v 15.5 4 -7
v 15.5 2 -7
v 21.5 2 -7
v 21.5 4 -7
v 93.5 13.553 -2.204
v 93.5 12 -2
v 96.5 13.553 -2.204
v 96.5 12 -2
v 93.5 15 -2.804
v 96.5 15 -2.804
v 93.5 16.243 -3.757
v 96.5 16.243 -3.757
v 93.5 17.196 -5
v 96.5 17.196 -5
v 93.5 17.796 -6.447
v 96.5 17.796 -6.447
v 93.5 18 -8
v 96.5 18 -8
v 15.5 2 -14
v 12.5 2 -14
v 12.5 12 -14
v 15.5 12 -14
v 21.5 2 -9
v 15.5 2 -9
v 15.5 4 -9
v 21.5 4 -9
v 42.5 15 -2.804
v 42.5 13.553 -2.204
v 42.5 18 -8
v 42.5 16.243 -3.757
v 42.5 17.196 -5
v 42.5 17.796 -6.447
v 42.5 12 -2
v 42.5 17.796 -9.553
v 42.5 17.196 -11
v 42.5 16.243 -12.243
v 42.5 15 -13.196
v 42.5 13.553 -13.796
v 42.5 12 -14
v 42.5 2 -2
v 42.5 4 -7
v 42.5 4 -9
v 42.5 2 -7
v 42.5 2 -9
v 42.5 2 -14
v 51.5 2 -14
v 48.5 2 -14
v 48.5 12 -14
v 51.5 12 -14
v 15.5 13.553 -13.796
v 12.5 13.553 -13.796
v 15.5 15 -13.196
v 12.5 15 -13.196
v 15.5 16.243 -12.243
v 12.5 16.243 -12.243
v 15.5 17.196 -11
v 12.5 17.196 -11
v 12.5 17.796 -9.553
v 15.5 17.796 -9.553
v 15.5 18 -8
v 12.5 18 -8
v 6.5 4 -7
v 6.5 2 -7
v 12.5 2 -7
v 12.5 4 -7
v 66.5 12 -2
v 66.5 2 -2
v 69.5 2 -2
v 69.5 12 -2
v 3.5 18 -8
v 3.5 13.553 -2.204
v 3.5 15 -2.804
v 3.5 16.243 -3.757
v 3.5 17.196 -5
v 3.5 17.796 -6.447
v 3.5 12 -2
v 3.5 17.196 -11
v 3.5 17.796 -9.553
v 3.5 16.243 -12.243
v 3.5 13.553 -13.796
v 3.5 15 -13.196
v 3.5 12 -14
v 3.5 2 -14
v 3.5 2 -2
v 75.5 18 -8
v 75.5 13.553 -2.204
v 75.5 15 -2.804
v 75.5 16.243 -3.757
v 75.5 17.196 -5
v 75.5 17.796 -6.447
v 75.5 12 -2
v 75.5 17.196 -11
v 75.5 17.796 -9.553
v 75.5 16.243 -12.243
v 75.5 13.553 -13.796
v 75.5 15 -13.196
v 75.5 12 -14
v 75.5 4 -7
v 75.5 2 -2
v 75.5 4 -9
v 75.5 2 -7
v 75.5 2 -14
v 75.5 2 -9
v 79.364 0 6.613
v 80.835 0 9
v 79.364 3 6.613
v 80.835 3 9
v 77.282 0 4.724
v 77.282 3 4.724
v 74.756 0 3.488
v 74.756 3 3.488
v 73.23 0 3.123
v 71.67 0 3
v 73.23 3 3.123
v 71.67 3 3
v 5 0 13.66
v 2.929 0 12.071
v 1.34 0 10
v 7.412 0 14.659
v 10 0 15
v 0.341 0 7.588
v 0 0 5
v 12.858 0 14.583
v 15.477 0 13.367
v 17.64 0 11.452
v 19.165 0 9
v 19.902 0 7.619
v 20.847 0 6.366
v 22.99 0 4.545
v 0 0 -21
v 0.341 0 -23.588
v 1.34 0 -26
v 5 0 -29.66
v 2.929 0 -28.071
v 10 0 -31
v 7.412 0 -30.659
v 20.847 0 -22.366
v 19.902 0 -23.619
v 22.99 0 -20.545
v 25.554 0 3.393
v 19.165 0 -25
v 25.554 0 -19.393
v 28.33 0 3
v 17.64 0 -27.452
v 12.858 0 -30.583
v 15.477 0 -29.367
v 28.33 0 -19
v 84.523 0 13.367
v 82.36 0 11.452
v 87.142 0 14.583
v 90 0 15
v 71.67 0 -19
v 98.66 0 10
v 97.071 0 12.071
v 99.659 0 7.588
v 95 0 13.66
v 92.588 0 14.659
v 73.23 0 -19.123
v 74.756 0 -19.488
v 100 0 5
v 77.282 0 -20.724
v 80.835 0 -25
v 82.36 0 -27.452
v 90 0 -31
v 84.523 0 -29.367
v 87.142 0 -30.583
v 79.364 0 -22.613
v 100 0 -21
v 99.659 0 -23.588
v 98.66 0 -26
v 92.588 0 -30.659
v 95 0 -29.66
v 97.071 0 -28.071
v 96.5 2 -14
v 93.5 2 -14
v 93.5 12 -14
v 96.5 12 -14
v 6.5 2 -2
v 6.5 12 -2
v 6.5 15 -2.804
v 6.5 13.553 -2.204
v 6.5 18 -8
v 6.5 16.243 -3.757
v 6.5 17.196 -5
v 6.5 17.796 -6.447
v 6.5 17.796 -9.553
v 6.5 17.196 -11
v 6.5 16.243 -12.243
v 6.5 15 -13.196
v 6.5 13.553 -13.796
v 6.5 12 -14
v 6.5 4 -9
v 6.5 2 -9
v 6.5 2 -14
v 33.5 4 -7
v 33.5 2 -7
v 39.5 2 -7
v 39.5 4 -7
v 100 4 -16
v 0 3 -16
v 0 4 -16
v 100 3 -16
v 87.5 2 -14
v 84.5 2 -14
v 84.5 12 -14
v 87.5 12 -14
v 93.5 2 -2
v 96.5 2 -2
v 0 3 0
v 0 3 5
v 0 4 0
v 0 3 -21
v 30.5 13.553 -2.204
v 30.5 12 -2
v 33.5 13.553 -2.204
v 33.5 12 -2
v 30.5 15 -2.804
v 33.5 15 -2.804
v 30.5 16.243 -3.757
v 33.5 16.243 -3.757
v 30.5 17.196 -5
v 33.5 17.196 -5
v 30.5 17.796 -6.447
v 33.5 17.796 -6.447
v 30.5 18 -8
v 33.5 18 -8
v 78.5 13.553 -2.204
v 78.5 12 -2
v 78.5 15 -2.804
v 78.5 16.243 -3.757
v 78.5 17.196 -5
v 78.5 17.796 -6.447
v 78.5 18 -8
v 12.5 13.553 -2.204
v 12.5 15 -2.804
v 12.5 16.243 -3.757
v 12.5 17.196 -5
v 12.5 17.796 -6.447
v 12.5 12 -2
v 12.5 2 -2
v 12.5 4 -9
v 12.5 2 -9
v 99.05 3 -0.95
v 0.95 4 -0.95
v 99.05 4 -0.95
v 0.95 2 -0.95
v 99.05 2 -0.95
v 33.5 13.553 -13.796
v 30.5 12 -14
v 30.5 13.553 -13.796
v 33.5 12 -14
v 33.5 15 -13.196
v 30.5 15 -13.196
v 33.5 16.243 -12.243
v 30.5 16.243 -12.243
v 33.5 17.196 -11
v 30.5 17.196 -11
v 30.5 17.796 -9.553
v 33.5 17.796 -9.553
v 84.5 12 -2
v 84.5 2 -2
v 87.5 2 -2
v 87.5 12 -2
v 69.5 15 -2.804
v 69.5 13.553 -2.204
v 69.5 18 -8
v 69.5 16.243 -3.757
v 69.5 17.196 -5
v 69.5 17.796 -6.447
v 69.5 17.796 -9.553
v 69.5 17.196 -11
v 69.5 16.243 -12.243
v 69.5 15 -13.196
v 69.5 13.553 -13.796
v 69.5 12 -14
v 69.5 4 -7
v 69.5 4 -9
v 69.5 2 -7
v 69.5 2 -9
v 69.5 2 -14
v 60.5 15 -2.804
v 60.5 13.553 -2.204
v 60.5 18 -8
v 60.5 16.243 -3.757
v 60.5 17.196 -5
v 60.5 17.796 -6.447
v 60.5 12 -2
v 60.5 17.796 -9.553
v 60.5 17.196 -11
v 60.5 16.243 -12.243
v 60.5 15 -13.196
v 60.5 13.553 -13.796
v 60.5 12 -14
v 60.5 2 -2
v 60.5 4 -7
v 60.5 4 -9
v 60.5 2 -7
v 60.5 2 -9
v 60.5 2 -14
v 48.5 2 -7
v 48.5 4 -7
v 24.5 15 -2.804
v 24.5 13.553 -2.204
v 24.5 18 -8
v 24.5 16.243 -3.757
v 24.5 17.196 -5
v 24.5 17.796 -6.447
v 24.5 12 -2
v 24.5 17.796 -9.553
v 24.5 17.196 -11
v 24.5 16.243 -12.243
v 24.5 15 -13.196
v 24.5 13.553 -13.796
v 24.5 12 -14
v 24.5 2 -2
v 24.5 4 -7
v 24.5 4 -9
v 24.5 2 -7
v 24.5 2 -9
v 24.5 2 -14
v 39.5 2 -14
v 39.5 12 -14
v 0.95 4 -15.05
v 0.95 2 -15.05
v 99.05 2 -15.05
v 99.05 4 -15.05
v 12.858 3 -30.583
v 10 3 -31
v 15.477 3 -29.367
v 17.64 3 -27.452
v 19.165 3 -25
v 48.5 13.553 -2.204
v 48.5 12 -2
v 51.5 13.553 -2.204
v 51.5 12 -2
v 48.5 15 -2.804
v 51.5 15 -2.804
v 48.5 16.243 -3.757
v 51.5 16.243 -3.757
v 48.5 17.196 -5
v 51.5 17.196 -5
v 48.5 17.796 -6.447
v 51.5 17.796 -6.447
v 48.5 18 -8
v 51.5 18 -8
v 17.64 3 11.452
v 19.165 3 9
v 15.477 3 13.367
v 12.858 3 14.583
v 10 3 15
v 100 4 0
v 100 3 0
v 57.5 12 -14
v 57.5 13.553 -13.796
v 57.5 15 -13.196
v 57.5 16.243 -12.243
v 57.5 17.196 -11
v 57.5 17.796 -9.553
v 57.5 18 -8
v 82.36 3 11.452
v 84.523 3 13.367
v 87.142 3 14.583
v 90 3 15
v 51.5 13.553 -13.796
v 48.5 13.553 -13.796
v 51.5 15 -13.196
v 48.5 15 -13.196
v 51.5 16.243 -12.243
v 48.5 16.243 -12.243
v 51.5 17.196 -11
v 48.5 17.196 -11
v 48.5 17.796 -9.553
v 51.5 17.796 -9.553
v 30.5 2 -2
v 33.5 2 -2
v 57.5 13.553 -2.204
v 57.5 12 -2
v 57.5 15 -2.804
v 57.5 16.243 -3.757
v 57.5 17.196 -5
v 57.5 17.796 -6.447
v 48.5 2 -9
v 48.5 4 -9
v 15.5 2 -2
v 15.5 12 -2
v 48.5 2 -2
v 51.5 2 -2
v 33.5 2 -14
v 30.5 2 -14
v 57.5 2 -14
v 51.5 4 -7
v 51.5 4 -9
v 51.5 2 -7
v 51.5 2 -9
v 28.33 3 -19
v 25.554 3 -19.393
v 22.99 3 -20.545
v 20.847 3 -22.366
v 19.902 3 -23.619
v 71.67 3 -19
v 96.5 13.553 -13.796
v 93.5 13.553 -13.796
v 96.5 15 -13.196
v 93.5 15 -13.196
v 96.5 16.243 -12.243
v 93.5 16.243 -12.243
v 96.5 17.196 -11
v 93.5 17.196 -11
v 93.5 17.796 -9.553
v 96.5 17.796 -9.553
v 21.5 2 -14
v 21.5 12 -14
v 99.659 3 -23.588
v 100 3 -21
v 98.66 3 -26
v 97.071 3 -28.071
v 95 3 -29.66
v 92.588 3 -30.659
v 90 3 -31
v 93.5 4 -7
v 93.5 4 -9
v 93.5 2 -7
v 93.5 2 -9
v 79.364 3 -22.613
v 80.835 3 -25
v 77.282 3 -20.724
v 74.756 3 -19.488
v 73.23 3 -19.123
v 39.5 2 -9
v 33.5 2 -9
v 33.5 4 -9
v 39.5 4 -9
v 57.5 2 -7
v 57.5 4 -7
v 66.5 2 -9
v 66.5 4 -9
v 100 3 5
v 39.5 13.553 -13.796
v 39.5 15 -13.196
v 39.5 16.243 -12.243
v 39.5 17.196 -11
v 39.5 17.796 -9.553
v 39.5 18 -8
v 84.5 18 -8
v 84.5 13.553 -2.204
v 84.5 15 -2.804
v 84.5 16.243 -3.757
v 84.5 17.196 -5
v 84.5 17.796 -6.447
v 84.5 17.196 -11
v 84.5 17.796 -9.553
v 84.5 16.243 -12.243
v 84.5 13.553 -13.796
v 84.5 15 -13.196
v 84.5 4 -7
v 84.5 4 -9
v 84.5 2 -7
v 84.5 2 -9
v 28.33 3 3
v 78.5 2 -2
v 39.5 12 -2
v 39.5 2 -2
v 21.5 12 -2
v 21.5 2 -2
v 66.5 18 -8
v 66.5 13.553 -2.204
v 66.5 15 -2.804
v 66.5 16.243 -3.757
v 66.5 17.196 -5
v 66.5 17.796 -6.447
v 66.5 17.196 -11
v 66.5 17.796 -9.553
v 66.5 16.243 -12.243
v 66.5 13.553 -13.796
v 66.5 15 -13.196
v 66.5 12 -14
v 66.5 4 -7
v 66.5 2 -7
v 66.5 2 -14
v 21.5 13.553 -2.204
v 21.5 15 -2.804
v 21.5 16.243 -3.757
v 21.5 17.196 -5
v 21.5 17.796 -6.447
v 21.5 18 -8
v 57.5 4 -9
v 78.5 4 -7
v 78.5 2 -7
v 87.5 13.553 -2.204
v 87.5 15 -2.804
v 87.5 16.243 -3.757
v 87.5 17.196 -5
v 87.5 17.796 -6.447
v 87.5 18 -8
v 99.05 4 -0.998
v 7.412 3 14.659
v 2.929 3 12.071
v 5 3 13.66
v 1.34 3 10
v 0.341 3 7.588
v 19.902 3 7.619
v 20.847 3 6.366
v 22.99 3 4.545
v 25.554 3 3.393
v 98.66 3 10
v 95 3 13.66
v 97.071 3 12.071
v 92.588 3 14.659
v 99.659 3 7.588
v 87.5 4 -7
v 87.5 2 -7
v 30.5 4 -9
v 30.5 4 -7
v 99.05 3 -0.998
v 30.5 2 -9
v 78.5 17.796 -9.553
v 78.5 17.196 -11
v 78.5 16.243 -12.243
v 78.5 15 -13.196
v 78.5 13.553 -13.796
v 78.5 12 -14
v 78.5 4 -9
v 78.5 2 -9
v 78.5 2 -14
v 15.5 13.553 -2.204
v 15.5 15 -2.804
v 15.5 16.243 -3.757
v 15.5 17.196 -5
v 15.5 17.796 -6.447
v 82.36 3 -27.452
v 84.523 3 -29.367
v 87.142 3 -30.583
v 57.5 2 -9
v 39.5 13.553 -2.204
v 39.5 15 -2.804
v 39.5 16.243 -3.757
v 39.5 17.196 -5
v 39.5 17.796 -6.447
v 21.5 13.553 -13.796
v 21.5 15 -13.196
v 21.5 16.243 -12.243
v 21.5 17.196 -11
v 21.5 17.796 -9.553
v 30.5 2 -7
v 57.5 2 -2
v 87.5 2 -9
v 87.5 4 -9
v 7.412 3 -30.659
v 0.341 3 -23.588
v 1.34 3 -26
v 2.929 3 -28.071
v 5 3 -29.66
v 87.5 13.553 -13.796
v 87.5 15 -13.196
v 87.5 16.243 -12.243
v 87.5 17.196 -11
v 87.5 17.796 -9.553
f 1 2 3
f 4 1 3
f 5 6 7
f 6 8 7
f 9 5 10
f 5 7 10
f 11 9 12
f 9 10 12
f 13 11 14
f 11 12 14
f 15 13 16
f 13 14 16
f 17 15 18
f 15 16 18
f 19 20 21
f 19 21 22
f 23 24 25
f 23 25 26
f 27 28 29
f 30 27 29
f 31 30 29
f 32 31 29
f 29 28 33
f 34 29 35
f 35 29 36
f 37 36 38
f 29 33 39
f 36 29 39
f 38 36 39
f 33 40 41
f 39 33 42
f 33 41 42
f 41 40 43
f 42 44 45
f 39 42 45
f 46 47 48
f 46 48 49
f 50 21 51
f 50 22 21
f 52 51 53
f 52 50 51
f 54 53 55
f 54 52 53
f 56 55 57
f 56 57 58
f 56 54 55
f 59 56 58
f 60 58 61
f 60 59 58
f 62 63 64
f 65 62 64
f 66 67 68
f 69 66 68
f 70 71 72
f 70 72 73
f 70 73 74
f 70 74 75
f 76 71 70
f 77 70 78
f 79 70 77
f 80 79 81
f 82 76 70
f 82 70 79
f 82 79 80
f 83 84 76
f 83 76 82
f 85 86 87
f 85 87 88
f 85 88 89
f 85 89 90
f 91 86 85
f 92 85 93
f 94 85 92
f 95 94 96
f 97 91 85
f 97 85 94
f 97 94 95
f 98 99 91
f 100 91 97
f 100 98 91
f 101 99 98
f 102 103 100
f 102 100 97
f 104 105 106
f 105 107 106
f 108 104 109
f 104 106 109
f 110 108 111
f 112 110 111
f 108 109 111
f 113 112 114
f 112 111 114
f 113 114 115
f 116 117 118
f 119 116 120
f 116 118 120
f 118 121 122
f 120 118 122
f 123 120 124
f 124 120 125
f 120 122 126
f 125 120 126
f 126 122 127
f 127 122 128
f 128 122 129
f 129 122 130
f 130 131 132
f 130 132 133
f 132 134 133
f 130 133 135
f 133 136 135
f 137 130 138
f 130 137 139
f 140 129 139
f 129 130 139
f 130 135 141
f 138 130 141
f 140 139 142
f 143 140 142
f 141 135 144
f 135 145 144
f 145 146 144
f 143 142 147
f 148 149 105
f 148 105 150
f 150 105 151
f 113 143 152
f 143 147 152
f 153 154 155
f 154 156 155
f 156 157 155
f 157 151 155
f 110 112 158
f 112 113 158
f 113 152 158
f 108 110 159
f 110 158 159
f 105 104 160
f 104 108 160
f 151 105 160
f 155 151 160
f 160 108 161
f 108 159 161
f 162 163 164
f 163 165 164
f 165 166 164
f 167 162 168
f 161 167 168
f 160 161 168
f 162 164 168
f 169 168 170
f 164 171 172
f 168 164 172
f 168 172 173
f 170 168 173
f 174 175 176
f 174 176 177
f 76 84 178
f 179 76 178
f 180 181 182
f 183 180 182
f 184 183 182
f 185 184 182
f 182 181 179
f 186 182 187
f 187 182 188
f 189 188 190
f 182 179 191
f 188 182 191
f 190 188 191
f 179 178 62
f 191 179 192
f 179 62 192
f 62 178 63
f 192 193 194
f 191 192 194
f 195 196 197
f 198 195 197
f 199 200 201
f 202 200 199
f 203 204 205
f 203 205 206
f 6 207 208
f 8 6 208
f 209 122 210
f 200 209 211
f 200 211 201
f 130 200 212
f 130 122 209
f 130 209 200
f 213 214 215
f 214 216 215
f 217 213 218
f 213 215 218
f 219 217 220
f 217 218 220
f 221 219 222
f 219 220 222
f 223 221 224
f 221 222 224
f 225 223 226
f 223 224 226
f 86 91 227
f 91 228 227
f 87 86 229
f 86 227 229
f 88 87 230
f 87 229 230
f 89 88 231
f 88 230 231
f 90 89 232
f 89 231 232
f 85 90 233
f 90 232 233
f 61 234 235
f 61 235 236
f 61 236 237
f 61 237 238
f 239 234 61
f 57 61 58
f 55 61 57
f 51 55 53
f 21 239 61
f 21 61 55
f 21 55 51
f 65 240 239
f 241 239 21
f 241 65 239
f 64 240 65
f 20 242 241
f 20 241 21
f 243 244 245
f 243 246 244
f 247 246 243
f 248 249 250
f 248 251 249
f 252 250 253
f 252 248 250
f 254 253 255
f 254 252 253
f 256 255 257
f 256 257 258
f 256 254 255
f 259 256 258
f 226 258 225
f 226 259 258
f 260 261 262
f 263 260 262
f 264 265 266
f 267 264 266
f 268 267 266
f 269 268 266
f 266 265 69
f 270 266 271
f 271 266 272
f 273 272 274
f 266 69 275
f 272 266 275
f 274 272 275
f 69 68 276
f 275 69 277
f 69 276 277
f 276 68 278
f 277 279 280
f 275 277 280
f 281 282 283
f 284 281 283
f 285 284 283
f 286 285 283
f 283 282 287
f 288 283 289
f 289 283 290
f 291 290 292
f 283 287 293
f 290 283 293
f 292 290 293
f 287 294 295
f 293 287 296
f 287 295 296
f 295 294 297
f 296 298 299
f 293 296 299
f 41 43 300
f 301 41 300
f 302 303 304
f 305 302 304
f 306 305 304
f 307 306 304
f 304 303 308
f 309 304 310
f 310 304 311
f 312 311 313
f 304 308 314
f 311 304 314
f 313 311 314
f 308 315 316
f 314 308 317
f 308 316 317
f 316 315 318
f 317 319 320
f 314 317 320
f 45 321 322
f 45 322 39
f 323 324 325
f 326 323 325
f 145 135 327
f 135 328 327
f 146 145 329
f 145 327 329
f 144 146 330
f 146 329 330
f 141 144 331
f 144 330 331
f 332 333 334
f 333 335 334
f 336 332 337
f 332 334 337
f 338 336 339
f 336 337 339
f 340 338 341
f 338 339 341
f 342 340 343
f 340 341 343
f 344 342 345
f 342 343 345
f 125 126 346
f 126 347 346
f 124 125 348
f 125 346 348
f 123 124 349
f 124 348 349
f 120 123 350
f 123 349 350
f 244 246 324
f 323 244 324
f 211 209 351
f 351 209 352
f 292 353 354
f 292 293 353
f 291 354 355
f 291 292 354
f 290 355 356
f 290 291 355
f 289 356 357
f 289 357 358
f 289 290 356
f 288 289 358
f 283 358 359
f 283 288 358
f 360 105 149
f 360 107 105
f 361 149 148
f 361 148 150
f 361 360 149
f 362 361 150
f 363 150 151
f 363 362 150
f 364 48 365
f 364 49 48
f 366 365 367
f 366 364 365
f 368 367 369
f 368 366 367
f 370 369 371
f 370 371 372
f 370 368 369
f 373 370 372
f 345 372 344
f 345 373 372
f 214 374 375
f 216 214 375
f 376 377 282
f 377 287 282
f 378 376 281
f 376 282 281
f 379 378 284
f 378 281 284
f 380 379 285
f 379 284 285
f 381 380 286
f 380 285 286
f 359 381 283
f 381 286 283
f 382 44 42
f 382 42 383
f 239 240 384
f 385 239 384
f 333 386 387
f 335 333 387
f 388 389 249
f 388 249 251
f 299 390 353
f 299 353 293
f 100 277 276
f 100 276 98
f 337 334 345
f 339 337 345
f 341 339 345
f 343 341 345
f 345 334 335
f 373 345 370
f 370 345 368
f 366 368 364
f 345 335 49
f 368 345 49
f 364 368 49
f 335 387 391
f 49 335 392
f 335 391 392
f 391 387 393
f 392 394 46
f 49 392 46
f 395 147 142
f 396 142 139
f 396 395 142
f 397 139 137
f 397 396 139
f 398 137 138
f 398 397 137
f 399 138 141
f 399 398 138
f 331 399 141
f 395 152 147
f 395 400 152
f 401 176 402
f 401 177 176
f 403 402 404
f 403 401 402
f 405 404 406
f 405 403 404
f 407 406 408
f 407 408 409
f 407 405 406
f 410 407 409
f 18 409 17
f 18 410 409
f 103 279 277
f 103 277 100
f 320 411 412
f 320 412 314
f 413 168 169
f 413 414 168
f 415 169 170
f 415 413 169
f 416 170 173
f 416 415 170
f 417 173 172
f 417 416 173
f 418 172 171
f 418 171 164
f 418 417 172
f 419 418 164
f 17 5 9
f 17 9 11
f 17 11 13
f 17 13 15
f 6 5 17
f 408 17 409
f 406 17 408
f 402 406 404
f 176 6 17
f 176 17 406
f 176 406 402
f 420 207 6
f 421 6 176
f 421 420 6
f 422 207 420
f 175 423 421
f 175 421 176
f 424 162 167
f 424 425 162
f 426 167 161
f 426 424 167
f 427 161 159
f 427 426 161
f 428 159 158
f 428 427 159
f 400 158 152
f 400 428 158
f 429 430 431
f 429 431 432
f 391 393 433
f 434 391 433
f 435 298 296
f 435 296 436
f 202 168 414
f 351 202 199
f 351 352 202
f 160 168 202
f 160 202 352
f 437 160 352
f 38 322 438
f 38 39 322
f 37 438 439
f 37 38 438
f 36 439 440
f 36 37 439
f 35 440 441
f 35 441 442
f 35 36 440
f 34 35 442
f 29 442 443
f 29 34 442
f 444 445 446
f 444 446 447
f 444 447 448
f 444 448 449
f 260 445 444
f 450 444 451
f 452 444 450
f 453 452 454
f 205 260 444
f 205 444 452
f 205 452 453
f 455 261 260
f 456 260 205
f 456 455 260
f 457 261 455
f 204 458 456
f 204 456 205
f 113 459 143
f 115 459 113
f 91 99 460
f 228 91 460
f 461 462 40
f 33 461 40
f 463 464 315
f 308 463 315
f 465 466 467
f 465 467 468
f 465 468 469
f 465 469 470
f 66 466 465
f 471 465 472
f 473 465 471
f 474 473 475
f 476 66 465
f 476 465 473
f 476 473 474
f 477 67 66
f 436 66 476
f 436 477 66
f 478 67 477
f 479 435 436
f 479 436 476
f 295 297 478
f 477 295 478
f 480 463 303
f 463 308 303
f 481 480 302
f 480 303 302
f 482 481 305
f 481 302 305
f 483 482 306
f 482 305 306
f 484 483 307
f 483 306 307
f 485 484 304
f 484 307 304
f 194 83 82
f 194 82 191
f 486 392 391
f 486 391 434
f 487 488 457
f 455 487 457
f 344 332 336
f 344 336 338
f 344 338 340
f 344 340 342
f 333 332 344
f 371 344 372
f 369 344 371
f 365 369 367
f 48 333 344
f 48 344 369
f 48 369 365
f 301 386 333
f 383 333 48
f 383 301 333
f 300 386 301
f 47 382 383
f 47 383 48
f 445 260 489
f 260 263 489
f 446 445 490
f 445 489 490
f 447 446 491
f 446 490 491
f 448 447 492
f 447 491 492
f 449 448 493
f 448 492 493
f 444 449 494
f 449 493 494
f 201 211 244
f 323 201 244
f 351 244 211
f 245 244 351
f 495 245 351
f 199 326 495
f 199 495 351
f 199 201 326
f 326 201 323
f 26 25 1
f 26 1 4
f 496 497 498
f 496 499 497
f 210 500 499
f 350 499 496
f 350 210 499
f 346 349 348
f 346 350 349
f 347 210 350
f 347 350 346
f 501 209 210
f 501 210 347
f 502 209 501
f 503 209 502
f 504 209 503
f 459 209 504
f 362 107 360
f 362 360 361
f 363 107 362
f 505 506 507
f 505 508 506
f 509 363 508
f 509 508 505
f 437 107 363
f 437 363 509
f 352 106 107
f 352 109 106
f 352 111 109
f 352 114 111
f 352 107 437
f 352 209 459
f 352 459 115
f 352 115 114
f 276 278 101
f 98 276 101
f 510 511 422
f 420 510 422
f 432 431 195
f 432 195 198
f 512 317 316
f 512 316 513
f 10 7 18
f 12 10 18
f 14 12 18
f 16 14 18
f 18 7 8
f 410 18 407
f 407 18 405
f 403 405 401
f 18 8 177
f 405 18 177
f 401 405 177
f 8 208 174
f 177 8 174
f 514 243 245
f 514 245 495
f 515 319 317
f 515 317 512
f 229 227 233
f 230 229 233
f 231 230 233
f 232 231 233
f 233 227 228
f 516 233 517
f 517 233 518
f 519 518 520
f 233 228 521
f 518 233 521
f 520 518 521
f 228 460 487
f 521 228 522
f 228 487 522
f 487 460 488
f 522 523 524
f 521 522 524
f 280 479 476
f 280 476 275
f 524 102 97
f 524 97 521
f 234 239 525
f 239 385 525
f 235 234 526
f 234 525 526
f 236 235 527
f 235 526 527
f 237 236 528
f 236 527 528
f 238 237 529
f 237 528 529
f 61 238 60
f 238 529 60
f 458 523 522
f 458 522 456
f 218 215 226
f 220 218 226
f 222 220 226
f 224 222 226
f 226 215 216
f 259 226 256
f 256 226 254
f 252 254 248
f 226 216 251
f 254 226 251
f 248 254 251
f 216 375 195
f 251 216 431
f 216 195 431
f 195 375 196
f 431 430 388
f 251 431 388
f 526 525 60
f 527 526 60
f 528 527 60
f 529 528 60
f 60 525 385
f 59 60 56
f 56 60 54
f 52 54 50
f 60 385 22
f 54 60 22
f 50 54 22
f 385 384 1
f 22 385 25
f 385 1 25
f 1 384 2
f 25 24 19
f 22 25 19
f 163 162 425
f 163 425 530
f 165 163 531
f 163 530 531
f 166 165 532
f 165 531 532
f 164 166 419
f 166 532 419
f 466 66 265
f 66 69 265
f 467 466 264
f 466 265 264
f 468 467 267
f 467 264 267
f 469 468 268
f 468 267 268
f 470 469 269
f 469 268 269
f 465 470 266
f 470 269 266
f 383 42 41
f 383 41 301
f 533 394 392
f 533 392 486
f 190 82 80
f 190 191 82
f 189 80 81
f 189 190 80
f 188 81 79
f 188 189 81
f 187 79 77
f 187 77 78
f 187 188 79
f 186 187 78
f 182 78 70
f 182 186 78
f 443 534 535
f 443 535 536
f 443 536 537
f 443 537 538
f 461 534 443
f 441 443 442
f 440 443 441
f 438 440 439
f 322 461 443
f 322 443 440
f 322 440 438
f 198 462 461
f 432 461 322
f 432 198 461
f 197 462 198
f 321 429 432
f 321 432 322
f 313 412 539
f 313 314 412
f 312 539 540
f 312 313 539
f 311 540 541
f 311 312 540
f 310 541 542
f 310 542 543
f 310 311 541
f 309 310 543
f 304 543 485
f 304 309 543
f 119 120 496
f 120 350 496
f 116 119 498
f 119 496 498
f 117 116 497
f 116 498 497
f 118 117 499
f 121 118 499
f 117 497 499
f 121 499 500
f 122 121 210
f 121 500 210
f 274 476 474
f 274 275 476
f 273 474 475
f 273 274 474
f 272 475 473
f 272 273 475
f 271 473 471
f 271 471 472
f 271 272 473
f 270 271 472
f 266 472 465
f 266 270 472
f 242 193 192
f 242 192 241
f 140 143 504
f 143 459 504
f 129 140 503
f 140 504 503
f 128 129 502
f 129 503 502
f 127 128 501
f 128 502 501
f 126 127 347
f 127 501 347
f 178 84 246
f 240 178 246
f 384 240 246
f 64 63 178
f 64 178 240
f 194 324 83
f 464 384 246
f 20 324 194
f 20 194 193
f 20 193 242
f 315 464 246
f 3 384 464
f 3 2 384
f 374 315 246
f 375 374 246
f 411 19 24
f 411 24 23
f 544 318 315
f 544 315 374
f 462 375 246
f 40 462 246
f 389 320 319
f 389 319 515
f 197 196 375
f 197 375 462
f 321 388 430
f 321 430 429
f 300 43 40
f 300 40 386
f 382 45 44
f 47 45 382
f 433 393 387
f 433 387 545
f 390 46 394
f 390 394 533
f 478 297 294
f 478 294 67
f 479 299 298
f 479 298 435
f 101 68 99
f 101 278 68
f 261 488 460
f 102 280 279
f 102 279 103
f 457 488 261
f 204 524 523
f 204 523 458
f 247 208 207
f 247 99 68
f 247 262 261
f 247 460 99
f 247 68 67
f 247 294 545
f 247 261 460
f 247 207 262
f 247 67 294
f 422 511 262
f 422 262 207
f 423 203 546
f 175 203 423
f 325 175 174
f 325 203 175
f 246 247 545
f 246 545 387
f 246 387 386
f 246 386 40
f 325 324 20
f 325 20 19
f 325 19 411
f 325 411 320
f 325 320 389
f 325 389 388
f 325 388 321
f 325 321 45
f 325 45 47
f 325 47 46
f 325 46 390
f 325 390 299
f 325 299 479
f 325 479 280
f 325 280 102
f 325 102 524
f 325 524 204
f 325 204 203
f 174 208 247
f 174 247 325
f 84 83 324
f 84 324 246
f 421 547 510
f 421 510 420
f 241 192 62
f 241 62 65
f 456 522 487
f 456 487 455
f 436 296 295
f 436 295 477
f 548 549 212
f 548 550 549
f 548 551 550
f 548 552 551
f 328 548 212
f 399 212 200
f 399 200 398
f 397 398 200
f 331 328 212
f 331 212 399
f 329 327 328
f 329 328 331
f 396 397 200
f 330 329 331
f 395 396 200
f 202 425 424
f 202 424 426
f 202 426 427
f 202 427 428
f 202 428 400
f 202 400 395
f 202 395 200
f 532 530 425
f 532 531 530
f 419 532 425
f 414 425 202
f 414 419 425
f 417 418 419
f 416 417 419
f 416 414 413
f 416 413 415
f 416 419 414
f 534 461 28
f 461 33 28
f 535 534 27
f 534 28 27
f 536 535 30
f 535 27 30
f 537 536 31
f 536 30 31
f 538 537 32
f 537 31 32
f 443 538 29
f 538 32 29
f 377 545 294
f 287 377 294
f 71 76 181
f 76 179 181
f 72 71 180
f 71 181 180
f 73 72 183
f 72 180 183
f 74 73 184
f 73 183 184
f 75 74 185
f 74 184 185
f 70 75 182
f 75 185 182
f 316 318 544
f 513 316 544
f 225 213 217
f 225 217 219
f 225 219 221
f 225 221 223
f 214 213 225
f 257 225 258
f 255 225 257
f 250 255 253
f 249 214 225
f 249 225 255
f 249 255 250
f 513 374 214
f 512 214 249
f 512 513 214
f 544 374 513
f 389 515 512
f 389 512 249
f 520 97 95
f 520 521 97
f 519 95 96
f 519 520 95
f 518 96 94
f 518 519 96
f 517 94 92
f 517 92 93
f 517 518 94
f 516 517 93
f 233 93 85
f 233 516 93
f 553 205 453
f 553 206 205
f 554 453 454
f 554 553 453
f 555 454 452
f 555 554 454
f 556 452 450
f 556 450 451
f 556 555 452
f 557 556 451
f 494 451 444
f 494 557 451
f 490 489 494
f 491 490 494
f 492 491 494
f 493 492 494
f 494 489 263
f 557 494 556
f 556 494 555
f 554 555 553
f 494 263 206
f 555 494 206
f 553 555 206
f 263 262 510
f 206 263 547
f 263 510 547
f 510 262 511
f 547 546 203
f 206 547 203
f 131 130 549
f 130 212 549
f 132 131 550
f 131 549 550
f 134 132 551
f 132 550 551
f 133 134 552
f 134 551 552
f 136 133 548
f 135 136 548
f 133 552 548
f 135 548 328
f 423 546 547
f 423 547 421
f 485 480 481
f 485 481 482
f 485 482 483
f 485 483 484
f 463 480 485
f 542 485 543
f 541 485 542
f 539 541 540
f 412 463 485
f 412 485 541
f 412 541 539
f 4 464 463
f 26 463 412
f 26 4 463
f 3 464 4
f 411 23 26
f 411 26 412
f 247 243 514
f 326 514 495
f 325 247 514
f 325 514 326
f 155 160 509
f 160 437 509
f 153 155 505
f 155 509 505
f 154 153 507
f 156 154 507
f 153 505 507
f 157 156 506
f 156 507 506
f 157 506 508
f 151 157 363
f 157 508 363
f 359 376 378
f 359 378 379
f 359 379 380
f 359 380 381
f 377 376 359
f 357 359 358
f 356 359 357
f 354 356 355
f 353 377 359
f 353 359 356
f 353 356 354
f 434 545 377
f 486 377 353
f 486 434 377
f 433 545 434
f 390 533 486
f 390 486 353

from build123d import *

# Parameters (mm, degrees)
SKETCH1_W            = 100
SKETCH1_H            = 16
BOSS_EXTRUDE1_DEPTH  = 3
SKETCH2_W            = 98
SKETCH2_H            = 14
CUT_EXTRUDE1_DEPTH   = 1
SKETCH5_W            = 20
SKETCH5_H            = 3
BOSS_EXTRUDE4_DEPTH  = 15
SKETCH6_W            = 20
SKETCH6_H            = 3
BOSS_EXTRUDE5_DEPTH  = 15
FILLET18_R           = 10
SKETCH7_W            = 3
SKETCH7_H            = 12
BOSS_EXTRUDE6_DEPTH  = 16
SKETCH8_W            = 6
SKETCH8_H            = 2
BOSS_EXTRUDE7_DEPTH  = 2
FILLET19_R           = 6
SKETCH10_W           = 60
SKETCH10_H           = 3
BOSS_EXTRUDE8_DEPTH  = 3
SKETCH11_W           = 60
SKETCH11_H           = 3
BOSS_EXTRUDE9_DEPTH  = 3
SKETCH12_W           = 0.95
SKETCH12_H           = 14
BOSS_EXTRUDE10_DEPTH = 3
SKETCH13_W           = 100
SKETCH13_H           = 0.95
BOSS_EXTRUDE11_DEPTH = 3
SKETCH14_W           = 0.95
SKETCH14_H           = 0.052088128
BOSS_EXTRUDE12_DEPTH = 3
SKETCH15_W           = 0.95
SKETCH15_H           = 0.047911872
SKETCH15_W_2         = 0.949734752
SKETCH15_H_2         = 0.052088128
BOSS_EXTRUDE13_DEPTH = 3
FILLET20_R           = 10
SKETCH17_W           = 98.1
SKETCH17_H           = 14.1
SKETCH17_W_2         = 97.1
SKETCH17_H_2         = 13.1
CUT_EXTRUDE2_DEPTH   = 4
SKETCH18_W           = 100
SKETCH18_H           = 16.05
SKETCH18_W_2         = 98
SKETCH18_H_2         = 14.05
CUT_EXTRUDE3_DEPTH   = 2


with BuildPart() as part:
    # Sketch1 → Boss-Extrude1 (new body)
    with BuildSketch(Plane(origin=(0, 0, 0), x_dir=(1, 0, 0), z_dir=(0, 1, 0))):
        with Locations((50, 8)):
            Rectangle(SKETCH1_W, SKETCH1_H)
    extrude(amount=BOSS_EXTRUDE1_DEPTH)

    # Sketch2 → Cut-Extrude1 (cut)
    with BuildSketch(Plane(origin=(0, 3, 0), x_dir=(1, 0, 0), z_dir=(0, 1, 0))):
        with Locations((50, 8)):
            Rectangle(SKETCH2_W, SKETCH2_H)
    extrude(amount=-CUT_EXTRUDE1_DEPTH, mode=Mode.SUBTRACT)

    # Sketch5 → Boss-Extrude4 (add)
    with BuildSketch(Plane.XY):
        with Locations((10, 1.5)):
            Rectangle(SKETCH5_W, SKETCH5_H)
        with Locations((90, 1.5)):
            Rectangle(SKETCH5_W, SKETCH5_H)
    extrude(amount=BOSS_EXTRUDE4_DEPTH)

    # Sketch6 → Boss-Extrude5 (add)
    with BuildSketch(Plane(origin=(0, 0, -16), x_dir=(-1, 0, 0), z_dir=(0, 0, -1))):
        with Locations((-90, 1.5)):
            Rectangle(SKETCH6_W, SKETCH6_H)
        with Locations((-10, 1.5)):
            Rectangle(SKETCH6_W, SKETCH6_H)
    extrude(amount=BOSS_EXTRUDE5_DEPTH)

    # Fillet18
    fillet18_edges = [part.edges().sort_by_distance(p)[0] for p in [
        (20, 1.5, 15),
        (0, 1.5, 15),
        (80, 1.5, 15),
        (100, 1.5, 15),
        (0, 1.5, -31),
        (20, 1.5, -31),
        (80, 1.5, -31),
        (100, 1.5, -31),
    ]]
    fillet(fillet18_edges, radius=FILLET18_R - 0.0001)  # a hair under: the kernel refuses the full size

    # Sketch7 → Boss-Extrude6 (add)
    with BuildSketch(Plane(origin=(0, 2, 0), x_dir=(1, 0, 0), z_dir=(0, 1, 0))):
        with Locations((95, 8)):
            Rectangle(SKETCH7_W, SKETCH7_H)
        with Locations((86, 8)):
            Rectangle(SKETCH7_W, SKETCH7_H)
        with Locations((77, 8)):
            Rectangle(SKETCH7_W, SKETCH7_H)
        with Locations((68, 8)):
            Rectangle(SKETCH7_W, SKETCH7_H)
        with Locations((59, 8)):
            Rectangle(SKETCH7_W, SKETCH7_H)
        with Locations((50, 8)):
            Rectangle(SKETCH7_W, SKETCH7_H)
        with Locations((41, 8)):
            Rectangle(SKETCH7_W, SKETCH7_H)
        with Locations((32, 8)):
            Rectangle(SKETCH7_W, SKETCH7_H)
        with Locations((23, 8)):
            Rectangle(SKETCH7_W, SKETCH7_H)
        with Locations((14, 8)):
            Rectangle(SKETCH7_W, SKETCH7_H)
        with Locations((5, 8)):
            Rectangle(SKETCH7_W, SKETCH7_H)
    extrude(amount=BOSS_EXTRUDE6_DEPTH)

    # Sketch8 → Boss-Extrude7 (add)
    with BuildSketch(Plane(origin=(0, 2, 0), x_dir=(1, 0, 0), z_dir=(0, 1, 0))):
        with Locations((90.5, 8)):
            Rectangle(SKETCH8_W, SKETCH8_H)
        with Locations((81.5, 8)):
            Rectangle(SKETCH8_W, SKETCH8_H)
        with Locations((72.5, 8)):
            Rectangle(SKETCH8_W, SKETCH8_H)
        with Locations((63.5, 8)):
            Rectangle(SKETCH8_W, SKETCH8_H)
        with Locations((54.5, 8)):
            Rectangle(SKETCH8_W, SKETCH8_H)
        with Locations((45.5, 8)):
            Rectangle(SKETCH8_W, SKETCH8_H)
        with Locations((36.5, 8)):
            Rectangle(SKETCH8_W, SKETCH8_H)
        with Locations((27.5, 8)):
            Rectangle(SKETCH8_W, SKETCH8_H)
        with Locations((18.5, 8)):
            Rectangle(SKETCH8_W, SKETCH8_H)
        with Locations((9.5, 8)):
            Rectangle(SKETCH8_W, SKETCH8_H)
    extrude(amount=BOSS_EXTRUDE7_DEPTH)

    # Fillet19
    fillet19_edges = [part.edges().sort_by_distance(p)[0] for p in [
        (95, 18, -2),
        (95, 18, -14),
        (86, 18, -2),
        (86, 18, -14),
        (77, 18, -2),
        (77, 18, -14),
        (68, 18, -2),
        (68, 18, -14),
        (59, 18, -2),
        (59, 18, -14),
        (50, 18, -2),
        (50, 18, -14),
        (41, 18, -2),
        (41, 18, -14),
        (32, 18, -2),
        (32, 18, -14),
        (23, 18, -14),
        (23, 18, -2),
        (14, 18, -2),
        (14, 18, -14),
        (5, 18, -2),
        (5, 18, -14),
    ]]
    fillet(fillet19_edges, radius=FILLET19_R - 0.0001)  # a hair under: the kernel refuses the full size

    # Sketch10 → Boss-Extrude8 (add)
    with BuildSketch(Plane(origin=(0, 0, -16), x_dir=(-1, 0, 0), z_dir=(0, 0, -1))):
        with Locations((-50, 1.5)):
            Rectangle(SKETCH10_W, SKETCH10_H)
    extrude(amount=BOSS_EXTRUDE8_DEPTH)

    # Sketch11 → Boss-Extrude9 (add)
    with BuildSketch(Plane.XY):
        with Locations((50, 1.5)):
            Rectangle(SKETCH11_W, SKETCH11_H)
    extrude(amount=BOSS_EXTRUDE9_DEPTH)

    # Sketch12 → Boss-Extrude10 (add)
    with BuildSketch(Plane(origin=(0, 3, 0), x_dir=(1, 0, 0), z_dir=(0, 1, 0))):
        with Locations((99.525, 7.997911872)):
            Rectangle(SKETCH12_W, SKETCH12_H)
        with Locations((0.475, 7.997911872)):
            Rectangle(SKETCH12_W, SKETCH12_H)
    extrude(amount=BOSS_EXTRUDE10_DEPTH)

    # Sketch13 → Boss-Extrude11 (add)
    with BuildSketch(Plane(origin=(0, 3, 0), x_dir=(1, 0, 0), z_dir=(0, 1, 0))):
        with Locations((50, 15.525)):
            Rectangle(SKETCH13_W, SKETCH13_H)
        with Locations((50, 0.475)):
            Rectangle(SKETCH13_W, SKETCH13_H)
    extrude(amount=BOSS_EXTRUDE11_DEPTH)

    # Sketch14 → Boss-Extrude12 (add)
    with BuildSketch(Plane(origin=(0, 3, 0), x_dir=(1, 0, 0), z_dir=(0, 1, 0))):
        with Locations((0.475, 15.023955936)):
            Rectangle(SKETCH14_W, SKETCH14_H)
    extrude(amount=BOSS_EXTRUDE12_DEPTH)

    # Sketch15 → Boss-Extrude13 (add)
    with BuildSketch(Plane(origin=(0, 3, 0), x_dir=(1, 0, 0), z_dir=(0, 1, 0))):
        with Locations((0.475, 0.973955936)):
            Rectangle(SKETCH15_W, SKETCH15_H)
        with Locations((99.525132624, 0.973955936)):
            Rectangle(SKETCH15_W_2, SKETCH15_H)
        with Locations((99.525, 15.023955936)):
            Rectangle(SKETCH15_W, SKETCH15_H_2)
    extrude(amount=BOSS_EXTRUDE13_DEPTH)

    # Fillet20
    fillet20_edges = [part.edges().sort_by_distance(p)[0] for p in [
        (20, 1.5, -19),
        (80, 1.5, -19),
        (80, 1.5, 3),
        (20, 1.5, 3),
    ]]
    fillet(fillet20_edges, radius=FILLET20_R)

    # Sketch17 → Cut-Extrude2 (cut)
    with BuildSketch(Plane(origin=(0, 6, 0), x_dir=(1, 0, 0), z_dir=(0, 1, 0))):
        with Locations((50, 8)):
            Rectangle(SKETCH17_W, SKETCH17_H)
        with Locations((50, 8)):
            Rectangle(SKETCH17_W_2, SKETCH17_H_2, mode=Mode.SUBTRACT)
    extrude(amount=-CUT_EXTRUDE2_DEPTH, mode=Mode.SUBTRACT)

    # Sketch18 → Cut-Extrude3 (cut)
    with BuildSketch(Plane(origin=(0, 6, 0), x_dir=(1, 0, 0), z_dir=(0, 1, 0))):
        with Locations((50, 7.975)):
            Rectangle(SKETCH18_W, SKETCH18_H)
        with Locations((50, 7.975)):
            Rectangle(SKETCH18_W_2, SKETCH18_H_2, mode=Mode.SUBTRACT)
    extrude(amount=-CUT_EXTRUDE3_DEPTH, mode=Mode.SUBTRACT)


solid = part.part
